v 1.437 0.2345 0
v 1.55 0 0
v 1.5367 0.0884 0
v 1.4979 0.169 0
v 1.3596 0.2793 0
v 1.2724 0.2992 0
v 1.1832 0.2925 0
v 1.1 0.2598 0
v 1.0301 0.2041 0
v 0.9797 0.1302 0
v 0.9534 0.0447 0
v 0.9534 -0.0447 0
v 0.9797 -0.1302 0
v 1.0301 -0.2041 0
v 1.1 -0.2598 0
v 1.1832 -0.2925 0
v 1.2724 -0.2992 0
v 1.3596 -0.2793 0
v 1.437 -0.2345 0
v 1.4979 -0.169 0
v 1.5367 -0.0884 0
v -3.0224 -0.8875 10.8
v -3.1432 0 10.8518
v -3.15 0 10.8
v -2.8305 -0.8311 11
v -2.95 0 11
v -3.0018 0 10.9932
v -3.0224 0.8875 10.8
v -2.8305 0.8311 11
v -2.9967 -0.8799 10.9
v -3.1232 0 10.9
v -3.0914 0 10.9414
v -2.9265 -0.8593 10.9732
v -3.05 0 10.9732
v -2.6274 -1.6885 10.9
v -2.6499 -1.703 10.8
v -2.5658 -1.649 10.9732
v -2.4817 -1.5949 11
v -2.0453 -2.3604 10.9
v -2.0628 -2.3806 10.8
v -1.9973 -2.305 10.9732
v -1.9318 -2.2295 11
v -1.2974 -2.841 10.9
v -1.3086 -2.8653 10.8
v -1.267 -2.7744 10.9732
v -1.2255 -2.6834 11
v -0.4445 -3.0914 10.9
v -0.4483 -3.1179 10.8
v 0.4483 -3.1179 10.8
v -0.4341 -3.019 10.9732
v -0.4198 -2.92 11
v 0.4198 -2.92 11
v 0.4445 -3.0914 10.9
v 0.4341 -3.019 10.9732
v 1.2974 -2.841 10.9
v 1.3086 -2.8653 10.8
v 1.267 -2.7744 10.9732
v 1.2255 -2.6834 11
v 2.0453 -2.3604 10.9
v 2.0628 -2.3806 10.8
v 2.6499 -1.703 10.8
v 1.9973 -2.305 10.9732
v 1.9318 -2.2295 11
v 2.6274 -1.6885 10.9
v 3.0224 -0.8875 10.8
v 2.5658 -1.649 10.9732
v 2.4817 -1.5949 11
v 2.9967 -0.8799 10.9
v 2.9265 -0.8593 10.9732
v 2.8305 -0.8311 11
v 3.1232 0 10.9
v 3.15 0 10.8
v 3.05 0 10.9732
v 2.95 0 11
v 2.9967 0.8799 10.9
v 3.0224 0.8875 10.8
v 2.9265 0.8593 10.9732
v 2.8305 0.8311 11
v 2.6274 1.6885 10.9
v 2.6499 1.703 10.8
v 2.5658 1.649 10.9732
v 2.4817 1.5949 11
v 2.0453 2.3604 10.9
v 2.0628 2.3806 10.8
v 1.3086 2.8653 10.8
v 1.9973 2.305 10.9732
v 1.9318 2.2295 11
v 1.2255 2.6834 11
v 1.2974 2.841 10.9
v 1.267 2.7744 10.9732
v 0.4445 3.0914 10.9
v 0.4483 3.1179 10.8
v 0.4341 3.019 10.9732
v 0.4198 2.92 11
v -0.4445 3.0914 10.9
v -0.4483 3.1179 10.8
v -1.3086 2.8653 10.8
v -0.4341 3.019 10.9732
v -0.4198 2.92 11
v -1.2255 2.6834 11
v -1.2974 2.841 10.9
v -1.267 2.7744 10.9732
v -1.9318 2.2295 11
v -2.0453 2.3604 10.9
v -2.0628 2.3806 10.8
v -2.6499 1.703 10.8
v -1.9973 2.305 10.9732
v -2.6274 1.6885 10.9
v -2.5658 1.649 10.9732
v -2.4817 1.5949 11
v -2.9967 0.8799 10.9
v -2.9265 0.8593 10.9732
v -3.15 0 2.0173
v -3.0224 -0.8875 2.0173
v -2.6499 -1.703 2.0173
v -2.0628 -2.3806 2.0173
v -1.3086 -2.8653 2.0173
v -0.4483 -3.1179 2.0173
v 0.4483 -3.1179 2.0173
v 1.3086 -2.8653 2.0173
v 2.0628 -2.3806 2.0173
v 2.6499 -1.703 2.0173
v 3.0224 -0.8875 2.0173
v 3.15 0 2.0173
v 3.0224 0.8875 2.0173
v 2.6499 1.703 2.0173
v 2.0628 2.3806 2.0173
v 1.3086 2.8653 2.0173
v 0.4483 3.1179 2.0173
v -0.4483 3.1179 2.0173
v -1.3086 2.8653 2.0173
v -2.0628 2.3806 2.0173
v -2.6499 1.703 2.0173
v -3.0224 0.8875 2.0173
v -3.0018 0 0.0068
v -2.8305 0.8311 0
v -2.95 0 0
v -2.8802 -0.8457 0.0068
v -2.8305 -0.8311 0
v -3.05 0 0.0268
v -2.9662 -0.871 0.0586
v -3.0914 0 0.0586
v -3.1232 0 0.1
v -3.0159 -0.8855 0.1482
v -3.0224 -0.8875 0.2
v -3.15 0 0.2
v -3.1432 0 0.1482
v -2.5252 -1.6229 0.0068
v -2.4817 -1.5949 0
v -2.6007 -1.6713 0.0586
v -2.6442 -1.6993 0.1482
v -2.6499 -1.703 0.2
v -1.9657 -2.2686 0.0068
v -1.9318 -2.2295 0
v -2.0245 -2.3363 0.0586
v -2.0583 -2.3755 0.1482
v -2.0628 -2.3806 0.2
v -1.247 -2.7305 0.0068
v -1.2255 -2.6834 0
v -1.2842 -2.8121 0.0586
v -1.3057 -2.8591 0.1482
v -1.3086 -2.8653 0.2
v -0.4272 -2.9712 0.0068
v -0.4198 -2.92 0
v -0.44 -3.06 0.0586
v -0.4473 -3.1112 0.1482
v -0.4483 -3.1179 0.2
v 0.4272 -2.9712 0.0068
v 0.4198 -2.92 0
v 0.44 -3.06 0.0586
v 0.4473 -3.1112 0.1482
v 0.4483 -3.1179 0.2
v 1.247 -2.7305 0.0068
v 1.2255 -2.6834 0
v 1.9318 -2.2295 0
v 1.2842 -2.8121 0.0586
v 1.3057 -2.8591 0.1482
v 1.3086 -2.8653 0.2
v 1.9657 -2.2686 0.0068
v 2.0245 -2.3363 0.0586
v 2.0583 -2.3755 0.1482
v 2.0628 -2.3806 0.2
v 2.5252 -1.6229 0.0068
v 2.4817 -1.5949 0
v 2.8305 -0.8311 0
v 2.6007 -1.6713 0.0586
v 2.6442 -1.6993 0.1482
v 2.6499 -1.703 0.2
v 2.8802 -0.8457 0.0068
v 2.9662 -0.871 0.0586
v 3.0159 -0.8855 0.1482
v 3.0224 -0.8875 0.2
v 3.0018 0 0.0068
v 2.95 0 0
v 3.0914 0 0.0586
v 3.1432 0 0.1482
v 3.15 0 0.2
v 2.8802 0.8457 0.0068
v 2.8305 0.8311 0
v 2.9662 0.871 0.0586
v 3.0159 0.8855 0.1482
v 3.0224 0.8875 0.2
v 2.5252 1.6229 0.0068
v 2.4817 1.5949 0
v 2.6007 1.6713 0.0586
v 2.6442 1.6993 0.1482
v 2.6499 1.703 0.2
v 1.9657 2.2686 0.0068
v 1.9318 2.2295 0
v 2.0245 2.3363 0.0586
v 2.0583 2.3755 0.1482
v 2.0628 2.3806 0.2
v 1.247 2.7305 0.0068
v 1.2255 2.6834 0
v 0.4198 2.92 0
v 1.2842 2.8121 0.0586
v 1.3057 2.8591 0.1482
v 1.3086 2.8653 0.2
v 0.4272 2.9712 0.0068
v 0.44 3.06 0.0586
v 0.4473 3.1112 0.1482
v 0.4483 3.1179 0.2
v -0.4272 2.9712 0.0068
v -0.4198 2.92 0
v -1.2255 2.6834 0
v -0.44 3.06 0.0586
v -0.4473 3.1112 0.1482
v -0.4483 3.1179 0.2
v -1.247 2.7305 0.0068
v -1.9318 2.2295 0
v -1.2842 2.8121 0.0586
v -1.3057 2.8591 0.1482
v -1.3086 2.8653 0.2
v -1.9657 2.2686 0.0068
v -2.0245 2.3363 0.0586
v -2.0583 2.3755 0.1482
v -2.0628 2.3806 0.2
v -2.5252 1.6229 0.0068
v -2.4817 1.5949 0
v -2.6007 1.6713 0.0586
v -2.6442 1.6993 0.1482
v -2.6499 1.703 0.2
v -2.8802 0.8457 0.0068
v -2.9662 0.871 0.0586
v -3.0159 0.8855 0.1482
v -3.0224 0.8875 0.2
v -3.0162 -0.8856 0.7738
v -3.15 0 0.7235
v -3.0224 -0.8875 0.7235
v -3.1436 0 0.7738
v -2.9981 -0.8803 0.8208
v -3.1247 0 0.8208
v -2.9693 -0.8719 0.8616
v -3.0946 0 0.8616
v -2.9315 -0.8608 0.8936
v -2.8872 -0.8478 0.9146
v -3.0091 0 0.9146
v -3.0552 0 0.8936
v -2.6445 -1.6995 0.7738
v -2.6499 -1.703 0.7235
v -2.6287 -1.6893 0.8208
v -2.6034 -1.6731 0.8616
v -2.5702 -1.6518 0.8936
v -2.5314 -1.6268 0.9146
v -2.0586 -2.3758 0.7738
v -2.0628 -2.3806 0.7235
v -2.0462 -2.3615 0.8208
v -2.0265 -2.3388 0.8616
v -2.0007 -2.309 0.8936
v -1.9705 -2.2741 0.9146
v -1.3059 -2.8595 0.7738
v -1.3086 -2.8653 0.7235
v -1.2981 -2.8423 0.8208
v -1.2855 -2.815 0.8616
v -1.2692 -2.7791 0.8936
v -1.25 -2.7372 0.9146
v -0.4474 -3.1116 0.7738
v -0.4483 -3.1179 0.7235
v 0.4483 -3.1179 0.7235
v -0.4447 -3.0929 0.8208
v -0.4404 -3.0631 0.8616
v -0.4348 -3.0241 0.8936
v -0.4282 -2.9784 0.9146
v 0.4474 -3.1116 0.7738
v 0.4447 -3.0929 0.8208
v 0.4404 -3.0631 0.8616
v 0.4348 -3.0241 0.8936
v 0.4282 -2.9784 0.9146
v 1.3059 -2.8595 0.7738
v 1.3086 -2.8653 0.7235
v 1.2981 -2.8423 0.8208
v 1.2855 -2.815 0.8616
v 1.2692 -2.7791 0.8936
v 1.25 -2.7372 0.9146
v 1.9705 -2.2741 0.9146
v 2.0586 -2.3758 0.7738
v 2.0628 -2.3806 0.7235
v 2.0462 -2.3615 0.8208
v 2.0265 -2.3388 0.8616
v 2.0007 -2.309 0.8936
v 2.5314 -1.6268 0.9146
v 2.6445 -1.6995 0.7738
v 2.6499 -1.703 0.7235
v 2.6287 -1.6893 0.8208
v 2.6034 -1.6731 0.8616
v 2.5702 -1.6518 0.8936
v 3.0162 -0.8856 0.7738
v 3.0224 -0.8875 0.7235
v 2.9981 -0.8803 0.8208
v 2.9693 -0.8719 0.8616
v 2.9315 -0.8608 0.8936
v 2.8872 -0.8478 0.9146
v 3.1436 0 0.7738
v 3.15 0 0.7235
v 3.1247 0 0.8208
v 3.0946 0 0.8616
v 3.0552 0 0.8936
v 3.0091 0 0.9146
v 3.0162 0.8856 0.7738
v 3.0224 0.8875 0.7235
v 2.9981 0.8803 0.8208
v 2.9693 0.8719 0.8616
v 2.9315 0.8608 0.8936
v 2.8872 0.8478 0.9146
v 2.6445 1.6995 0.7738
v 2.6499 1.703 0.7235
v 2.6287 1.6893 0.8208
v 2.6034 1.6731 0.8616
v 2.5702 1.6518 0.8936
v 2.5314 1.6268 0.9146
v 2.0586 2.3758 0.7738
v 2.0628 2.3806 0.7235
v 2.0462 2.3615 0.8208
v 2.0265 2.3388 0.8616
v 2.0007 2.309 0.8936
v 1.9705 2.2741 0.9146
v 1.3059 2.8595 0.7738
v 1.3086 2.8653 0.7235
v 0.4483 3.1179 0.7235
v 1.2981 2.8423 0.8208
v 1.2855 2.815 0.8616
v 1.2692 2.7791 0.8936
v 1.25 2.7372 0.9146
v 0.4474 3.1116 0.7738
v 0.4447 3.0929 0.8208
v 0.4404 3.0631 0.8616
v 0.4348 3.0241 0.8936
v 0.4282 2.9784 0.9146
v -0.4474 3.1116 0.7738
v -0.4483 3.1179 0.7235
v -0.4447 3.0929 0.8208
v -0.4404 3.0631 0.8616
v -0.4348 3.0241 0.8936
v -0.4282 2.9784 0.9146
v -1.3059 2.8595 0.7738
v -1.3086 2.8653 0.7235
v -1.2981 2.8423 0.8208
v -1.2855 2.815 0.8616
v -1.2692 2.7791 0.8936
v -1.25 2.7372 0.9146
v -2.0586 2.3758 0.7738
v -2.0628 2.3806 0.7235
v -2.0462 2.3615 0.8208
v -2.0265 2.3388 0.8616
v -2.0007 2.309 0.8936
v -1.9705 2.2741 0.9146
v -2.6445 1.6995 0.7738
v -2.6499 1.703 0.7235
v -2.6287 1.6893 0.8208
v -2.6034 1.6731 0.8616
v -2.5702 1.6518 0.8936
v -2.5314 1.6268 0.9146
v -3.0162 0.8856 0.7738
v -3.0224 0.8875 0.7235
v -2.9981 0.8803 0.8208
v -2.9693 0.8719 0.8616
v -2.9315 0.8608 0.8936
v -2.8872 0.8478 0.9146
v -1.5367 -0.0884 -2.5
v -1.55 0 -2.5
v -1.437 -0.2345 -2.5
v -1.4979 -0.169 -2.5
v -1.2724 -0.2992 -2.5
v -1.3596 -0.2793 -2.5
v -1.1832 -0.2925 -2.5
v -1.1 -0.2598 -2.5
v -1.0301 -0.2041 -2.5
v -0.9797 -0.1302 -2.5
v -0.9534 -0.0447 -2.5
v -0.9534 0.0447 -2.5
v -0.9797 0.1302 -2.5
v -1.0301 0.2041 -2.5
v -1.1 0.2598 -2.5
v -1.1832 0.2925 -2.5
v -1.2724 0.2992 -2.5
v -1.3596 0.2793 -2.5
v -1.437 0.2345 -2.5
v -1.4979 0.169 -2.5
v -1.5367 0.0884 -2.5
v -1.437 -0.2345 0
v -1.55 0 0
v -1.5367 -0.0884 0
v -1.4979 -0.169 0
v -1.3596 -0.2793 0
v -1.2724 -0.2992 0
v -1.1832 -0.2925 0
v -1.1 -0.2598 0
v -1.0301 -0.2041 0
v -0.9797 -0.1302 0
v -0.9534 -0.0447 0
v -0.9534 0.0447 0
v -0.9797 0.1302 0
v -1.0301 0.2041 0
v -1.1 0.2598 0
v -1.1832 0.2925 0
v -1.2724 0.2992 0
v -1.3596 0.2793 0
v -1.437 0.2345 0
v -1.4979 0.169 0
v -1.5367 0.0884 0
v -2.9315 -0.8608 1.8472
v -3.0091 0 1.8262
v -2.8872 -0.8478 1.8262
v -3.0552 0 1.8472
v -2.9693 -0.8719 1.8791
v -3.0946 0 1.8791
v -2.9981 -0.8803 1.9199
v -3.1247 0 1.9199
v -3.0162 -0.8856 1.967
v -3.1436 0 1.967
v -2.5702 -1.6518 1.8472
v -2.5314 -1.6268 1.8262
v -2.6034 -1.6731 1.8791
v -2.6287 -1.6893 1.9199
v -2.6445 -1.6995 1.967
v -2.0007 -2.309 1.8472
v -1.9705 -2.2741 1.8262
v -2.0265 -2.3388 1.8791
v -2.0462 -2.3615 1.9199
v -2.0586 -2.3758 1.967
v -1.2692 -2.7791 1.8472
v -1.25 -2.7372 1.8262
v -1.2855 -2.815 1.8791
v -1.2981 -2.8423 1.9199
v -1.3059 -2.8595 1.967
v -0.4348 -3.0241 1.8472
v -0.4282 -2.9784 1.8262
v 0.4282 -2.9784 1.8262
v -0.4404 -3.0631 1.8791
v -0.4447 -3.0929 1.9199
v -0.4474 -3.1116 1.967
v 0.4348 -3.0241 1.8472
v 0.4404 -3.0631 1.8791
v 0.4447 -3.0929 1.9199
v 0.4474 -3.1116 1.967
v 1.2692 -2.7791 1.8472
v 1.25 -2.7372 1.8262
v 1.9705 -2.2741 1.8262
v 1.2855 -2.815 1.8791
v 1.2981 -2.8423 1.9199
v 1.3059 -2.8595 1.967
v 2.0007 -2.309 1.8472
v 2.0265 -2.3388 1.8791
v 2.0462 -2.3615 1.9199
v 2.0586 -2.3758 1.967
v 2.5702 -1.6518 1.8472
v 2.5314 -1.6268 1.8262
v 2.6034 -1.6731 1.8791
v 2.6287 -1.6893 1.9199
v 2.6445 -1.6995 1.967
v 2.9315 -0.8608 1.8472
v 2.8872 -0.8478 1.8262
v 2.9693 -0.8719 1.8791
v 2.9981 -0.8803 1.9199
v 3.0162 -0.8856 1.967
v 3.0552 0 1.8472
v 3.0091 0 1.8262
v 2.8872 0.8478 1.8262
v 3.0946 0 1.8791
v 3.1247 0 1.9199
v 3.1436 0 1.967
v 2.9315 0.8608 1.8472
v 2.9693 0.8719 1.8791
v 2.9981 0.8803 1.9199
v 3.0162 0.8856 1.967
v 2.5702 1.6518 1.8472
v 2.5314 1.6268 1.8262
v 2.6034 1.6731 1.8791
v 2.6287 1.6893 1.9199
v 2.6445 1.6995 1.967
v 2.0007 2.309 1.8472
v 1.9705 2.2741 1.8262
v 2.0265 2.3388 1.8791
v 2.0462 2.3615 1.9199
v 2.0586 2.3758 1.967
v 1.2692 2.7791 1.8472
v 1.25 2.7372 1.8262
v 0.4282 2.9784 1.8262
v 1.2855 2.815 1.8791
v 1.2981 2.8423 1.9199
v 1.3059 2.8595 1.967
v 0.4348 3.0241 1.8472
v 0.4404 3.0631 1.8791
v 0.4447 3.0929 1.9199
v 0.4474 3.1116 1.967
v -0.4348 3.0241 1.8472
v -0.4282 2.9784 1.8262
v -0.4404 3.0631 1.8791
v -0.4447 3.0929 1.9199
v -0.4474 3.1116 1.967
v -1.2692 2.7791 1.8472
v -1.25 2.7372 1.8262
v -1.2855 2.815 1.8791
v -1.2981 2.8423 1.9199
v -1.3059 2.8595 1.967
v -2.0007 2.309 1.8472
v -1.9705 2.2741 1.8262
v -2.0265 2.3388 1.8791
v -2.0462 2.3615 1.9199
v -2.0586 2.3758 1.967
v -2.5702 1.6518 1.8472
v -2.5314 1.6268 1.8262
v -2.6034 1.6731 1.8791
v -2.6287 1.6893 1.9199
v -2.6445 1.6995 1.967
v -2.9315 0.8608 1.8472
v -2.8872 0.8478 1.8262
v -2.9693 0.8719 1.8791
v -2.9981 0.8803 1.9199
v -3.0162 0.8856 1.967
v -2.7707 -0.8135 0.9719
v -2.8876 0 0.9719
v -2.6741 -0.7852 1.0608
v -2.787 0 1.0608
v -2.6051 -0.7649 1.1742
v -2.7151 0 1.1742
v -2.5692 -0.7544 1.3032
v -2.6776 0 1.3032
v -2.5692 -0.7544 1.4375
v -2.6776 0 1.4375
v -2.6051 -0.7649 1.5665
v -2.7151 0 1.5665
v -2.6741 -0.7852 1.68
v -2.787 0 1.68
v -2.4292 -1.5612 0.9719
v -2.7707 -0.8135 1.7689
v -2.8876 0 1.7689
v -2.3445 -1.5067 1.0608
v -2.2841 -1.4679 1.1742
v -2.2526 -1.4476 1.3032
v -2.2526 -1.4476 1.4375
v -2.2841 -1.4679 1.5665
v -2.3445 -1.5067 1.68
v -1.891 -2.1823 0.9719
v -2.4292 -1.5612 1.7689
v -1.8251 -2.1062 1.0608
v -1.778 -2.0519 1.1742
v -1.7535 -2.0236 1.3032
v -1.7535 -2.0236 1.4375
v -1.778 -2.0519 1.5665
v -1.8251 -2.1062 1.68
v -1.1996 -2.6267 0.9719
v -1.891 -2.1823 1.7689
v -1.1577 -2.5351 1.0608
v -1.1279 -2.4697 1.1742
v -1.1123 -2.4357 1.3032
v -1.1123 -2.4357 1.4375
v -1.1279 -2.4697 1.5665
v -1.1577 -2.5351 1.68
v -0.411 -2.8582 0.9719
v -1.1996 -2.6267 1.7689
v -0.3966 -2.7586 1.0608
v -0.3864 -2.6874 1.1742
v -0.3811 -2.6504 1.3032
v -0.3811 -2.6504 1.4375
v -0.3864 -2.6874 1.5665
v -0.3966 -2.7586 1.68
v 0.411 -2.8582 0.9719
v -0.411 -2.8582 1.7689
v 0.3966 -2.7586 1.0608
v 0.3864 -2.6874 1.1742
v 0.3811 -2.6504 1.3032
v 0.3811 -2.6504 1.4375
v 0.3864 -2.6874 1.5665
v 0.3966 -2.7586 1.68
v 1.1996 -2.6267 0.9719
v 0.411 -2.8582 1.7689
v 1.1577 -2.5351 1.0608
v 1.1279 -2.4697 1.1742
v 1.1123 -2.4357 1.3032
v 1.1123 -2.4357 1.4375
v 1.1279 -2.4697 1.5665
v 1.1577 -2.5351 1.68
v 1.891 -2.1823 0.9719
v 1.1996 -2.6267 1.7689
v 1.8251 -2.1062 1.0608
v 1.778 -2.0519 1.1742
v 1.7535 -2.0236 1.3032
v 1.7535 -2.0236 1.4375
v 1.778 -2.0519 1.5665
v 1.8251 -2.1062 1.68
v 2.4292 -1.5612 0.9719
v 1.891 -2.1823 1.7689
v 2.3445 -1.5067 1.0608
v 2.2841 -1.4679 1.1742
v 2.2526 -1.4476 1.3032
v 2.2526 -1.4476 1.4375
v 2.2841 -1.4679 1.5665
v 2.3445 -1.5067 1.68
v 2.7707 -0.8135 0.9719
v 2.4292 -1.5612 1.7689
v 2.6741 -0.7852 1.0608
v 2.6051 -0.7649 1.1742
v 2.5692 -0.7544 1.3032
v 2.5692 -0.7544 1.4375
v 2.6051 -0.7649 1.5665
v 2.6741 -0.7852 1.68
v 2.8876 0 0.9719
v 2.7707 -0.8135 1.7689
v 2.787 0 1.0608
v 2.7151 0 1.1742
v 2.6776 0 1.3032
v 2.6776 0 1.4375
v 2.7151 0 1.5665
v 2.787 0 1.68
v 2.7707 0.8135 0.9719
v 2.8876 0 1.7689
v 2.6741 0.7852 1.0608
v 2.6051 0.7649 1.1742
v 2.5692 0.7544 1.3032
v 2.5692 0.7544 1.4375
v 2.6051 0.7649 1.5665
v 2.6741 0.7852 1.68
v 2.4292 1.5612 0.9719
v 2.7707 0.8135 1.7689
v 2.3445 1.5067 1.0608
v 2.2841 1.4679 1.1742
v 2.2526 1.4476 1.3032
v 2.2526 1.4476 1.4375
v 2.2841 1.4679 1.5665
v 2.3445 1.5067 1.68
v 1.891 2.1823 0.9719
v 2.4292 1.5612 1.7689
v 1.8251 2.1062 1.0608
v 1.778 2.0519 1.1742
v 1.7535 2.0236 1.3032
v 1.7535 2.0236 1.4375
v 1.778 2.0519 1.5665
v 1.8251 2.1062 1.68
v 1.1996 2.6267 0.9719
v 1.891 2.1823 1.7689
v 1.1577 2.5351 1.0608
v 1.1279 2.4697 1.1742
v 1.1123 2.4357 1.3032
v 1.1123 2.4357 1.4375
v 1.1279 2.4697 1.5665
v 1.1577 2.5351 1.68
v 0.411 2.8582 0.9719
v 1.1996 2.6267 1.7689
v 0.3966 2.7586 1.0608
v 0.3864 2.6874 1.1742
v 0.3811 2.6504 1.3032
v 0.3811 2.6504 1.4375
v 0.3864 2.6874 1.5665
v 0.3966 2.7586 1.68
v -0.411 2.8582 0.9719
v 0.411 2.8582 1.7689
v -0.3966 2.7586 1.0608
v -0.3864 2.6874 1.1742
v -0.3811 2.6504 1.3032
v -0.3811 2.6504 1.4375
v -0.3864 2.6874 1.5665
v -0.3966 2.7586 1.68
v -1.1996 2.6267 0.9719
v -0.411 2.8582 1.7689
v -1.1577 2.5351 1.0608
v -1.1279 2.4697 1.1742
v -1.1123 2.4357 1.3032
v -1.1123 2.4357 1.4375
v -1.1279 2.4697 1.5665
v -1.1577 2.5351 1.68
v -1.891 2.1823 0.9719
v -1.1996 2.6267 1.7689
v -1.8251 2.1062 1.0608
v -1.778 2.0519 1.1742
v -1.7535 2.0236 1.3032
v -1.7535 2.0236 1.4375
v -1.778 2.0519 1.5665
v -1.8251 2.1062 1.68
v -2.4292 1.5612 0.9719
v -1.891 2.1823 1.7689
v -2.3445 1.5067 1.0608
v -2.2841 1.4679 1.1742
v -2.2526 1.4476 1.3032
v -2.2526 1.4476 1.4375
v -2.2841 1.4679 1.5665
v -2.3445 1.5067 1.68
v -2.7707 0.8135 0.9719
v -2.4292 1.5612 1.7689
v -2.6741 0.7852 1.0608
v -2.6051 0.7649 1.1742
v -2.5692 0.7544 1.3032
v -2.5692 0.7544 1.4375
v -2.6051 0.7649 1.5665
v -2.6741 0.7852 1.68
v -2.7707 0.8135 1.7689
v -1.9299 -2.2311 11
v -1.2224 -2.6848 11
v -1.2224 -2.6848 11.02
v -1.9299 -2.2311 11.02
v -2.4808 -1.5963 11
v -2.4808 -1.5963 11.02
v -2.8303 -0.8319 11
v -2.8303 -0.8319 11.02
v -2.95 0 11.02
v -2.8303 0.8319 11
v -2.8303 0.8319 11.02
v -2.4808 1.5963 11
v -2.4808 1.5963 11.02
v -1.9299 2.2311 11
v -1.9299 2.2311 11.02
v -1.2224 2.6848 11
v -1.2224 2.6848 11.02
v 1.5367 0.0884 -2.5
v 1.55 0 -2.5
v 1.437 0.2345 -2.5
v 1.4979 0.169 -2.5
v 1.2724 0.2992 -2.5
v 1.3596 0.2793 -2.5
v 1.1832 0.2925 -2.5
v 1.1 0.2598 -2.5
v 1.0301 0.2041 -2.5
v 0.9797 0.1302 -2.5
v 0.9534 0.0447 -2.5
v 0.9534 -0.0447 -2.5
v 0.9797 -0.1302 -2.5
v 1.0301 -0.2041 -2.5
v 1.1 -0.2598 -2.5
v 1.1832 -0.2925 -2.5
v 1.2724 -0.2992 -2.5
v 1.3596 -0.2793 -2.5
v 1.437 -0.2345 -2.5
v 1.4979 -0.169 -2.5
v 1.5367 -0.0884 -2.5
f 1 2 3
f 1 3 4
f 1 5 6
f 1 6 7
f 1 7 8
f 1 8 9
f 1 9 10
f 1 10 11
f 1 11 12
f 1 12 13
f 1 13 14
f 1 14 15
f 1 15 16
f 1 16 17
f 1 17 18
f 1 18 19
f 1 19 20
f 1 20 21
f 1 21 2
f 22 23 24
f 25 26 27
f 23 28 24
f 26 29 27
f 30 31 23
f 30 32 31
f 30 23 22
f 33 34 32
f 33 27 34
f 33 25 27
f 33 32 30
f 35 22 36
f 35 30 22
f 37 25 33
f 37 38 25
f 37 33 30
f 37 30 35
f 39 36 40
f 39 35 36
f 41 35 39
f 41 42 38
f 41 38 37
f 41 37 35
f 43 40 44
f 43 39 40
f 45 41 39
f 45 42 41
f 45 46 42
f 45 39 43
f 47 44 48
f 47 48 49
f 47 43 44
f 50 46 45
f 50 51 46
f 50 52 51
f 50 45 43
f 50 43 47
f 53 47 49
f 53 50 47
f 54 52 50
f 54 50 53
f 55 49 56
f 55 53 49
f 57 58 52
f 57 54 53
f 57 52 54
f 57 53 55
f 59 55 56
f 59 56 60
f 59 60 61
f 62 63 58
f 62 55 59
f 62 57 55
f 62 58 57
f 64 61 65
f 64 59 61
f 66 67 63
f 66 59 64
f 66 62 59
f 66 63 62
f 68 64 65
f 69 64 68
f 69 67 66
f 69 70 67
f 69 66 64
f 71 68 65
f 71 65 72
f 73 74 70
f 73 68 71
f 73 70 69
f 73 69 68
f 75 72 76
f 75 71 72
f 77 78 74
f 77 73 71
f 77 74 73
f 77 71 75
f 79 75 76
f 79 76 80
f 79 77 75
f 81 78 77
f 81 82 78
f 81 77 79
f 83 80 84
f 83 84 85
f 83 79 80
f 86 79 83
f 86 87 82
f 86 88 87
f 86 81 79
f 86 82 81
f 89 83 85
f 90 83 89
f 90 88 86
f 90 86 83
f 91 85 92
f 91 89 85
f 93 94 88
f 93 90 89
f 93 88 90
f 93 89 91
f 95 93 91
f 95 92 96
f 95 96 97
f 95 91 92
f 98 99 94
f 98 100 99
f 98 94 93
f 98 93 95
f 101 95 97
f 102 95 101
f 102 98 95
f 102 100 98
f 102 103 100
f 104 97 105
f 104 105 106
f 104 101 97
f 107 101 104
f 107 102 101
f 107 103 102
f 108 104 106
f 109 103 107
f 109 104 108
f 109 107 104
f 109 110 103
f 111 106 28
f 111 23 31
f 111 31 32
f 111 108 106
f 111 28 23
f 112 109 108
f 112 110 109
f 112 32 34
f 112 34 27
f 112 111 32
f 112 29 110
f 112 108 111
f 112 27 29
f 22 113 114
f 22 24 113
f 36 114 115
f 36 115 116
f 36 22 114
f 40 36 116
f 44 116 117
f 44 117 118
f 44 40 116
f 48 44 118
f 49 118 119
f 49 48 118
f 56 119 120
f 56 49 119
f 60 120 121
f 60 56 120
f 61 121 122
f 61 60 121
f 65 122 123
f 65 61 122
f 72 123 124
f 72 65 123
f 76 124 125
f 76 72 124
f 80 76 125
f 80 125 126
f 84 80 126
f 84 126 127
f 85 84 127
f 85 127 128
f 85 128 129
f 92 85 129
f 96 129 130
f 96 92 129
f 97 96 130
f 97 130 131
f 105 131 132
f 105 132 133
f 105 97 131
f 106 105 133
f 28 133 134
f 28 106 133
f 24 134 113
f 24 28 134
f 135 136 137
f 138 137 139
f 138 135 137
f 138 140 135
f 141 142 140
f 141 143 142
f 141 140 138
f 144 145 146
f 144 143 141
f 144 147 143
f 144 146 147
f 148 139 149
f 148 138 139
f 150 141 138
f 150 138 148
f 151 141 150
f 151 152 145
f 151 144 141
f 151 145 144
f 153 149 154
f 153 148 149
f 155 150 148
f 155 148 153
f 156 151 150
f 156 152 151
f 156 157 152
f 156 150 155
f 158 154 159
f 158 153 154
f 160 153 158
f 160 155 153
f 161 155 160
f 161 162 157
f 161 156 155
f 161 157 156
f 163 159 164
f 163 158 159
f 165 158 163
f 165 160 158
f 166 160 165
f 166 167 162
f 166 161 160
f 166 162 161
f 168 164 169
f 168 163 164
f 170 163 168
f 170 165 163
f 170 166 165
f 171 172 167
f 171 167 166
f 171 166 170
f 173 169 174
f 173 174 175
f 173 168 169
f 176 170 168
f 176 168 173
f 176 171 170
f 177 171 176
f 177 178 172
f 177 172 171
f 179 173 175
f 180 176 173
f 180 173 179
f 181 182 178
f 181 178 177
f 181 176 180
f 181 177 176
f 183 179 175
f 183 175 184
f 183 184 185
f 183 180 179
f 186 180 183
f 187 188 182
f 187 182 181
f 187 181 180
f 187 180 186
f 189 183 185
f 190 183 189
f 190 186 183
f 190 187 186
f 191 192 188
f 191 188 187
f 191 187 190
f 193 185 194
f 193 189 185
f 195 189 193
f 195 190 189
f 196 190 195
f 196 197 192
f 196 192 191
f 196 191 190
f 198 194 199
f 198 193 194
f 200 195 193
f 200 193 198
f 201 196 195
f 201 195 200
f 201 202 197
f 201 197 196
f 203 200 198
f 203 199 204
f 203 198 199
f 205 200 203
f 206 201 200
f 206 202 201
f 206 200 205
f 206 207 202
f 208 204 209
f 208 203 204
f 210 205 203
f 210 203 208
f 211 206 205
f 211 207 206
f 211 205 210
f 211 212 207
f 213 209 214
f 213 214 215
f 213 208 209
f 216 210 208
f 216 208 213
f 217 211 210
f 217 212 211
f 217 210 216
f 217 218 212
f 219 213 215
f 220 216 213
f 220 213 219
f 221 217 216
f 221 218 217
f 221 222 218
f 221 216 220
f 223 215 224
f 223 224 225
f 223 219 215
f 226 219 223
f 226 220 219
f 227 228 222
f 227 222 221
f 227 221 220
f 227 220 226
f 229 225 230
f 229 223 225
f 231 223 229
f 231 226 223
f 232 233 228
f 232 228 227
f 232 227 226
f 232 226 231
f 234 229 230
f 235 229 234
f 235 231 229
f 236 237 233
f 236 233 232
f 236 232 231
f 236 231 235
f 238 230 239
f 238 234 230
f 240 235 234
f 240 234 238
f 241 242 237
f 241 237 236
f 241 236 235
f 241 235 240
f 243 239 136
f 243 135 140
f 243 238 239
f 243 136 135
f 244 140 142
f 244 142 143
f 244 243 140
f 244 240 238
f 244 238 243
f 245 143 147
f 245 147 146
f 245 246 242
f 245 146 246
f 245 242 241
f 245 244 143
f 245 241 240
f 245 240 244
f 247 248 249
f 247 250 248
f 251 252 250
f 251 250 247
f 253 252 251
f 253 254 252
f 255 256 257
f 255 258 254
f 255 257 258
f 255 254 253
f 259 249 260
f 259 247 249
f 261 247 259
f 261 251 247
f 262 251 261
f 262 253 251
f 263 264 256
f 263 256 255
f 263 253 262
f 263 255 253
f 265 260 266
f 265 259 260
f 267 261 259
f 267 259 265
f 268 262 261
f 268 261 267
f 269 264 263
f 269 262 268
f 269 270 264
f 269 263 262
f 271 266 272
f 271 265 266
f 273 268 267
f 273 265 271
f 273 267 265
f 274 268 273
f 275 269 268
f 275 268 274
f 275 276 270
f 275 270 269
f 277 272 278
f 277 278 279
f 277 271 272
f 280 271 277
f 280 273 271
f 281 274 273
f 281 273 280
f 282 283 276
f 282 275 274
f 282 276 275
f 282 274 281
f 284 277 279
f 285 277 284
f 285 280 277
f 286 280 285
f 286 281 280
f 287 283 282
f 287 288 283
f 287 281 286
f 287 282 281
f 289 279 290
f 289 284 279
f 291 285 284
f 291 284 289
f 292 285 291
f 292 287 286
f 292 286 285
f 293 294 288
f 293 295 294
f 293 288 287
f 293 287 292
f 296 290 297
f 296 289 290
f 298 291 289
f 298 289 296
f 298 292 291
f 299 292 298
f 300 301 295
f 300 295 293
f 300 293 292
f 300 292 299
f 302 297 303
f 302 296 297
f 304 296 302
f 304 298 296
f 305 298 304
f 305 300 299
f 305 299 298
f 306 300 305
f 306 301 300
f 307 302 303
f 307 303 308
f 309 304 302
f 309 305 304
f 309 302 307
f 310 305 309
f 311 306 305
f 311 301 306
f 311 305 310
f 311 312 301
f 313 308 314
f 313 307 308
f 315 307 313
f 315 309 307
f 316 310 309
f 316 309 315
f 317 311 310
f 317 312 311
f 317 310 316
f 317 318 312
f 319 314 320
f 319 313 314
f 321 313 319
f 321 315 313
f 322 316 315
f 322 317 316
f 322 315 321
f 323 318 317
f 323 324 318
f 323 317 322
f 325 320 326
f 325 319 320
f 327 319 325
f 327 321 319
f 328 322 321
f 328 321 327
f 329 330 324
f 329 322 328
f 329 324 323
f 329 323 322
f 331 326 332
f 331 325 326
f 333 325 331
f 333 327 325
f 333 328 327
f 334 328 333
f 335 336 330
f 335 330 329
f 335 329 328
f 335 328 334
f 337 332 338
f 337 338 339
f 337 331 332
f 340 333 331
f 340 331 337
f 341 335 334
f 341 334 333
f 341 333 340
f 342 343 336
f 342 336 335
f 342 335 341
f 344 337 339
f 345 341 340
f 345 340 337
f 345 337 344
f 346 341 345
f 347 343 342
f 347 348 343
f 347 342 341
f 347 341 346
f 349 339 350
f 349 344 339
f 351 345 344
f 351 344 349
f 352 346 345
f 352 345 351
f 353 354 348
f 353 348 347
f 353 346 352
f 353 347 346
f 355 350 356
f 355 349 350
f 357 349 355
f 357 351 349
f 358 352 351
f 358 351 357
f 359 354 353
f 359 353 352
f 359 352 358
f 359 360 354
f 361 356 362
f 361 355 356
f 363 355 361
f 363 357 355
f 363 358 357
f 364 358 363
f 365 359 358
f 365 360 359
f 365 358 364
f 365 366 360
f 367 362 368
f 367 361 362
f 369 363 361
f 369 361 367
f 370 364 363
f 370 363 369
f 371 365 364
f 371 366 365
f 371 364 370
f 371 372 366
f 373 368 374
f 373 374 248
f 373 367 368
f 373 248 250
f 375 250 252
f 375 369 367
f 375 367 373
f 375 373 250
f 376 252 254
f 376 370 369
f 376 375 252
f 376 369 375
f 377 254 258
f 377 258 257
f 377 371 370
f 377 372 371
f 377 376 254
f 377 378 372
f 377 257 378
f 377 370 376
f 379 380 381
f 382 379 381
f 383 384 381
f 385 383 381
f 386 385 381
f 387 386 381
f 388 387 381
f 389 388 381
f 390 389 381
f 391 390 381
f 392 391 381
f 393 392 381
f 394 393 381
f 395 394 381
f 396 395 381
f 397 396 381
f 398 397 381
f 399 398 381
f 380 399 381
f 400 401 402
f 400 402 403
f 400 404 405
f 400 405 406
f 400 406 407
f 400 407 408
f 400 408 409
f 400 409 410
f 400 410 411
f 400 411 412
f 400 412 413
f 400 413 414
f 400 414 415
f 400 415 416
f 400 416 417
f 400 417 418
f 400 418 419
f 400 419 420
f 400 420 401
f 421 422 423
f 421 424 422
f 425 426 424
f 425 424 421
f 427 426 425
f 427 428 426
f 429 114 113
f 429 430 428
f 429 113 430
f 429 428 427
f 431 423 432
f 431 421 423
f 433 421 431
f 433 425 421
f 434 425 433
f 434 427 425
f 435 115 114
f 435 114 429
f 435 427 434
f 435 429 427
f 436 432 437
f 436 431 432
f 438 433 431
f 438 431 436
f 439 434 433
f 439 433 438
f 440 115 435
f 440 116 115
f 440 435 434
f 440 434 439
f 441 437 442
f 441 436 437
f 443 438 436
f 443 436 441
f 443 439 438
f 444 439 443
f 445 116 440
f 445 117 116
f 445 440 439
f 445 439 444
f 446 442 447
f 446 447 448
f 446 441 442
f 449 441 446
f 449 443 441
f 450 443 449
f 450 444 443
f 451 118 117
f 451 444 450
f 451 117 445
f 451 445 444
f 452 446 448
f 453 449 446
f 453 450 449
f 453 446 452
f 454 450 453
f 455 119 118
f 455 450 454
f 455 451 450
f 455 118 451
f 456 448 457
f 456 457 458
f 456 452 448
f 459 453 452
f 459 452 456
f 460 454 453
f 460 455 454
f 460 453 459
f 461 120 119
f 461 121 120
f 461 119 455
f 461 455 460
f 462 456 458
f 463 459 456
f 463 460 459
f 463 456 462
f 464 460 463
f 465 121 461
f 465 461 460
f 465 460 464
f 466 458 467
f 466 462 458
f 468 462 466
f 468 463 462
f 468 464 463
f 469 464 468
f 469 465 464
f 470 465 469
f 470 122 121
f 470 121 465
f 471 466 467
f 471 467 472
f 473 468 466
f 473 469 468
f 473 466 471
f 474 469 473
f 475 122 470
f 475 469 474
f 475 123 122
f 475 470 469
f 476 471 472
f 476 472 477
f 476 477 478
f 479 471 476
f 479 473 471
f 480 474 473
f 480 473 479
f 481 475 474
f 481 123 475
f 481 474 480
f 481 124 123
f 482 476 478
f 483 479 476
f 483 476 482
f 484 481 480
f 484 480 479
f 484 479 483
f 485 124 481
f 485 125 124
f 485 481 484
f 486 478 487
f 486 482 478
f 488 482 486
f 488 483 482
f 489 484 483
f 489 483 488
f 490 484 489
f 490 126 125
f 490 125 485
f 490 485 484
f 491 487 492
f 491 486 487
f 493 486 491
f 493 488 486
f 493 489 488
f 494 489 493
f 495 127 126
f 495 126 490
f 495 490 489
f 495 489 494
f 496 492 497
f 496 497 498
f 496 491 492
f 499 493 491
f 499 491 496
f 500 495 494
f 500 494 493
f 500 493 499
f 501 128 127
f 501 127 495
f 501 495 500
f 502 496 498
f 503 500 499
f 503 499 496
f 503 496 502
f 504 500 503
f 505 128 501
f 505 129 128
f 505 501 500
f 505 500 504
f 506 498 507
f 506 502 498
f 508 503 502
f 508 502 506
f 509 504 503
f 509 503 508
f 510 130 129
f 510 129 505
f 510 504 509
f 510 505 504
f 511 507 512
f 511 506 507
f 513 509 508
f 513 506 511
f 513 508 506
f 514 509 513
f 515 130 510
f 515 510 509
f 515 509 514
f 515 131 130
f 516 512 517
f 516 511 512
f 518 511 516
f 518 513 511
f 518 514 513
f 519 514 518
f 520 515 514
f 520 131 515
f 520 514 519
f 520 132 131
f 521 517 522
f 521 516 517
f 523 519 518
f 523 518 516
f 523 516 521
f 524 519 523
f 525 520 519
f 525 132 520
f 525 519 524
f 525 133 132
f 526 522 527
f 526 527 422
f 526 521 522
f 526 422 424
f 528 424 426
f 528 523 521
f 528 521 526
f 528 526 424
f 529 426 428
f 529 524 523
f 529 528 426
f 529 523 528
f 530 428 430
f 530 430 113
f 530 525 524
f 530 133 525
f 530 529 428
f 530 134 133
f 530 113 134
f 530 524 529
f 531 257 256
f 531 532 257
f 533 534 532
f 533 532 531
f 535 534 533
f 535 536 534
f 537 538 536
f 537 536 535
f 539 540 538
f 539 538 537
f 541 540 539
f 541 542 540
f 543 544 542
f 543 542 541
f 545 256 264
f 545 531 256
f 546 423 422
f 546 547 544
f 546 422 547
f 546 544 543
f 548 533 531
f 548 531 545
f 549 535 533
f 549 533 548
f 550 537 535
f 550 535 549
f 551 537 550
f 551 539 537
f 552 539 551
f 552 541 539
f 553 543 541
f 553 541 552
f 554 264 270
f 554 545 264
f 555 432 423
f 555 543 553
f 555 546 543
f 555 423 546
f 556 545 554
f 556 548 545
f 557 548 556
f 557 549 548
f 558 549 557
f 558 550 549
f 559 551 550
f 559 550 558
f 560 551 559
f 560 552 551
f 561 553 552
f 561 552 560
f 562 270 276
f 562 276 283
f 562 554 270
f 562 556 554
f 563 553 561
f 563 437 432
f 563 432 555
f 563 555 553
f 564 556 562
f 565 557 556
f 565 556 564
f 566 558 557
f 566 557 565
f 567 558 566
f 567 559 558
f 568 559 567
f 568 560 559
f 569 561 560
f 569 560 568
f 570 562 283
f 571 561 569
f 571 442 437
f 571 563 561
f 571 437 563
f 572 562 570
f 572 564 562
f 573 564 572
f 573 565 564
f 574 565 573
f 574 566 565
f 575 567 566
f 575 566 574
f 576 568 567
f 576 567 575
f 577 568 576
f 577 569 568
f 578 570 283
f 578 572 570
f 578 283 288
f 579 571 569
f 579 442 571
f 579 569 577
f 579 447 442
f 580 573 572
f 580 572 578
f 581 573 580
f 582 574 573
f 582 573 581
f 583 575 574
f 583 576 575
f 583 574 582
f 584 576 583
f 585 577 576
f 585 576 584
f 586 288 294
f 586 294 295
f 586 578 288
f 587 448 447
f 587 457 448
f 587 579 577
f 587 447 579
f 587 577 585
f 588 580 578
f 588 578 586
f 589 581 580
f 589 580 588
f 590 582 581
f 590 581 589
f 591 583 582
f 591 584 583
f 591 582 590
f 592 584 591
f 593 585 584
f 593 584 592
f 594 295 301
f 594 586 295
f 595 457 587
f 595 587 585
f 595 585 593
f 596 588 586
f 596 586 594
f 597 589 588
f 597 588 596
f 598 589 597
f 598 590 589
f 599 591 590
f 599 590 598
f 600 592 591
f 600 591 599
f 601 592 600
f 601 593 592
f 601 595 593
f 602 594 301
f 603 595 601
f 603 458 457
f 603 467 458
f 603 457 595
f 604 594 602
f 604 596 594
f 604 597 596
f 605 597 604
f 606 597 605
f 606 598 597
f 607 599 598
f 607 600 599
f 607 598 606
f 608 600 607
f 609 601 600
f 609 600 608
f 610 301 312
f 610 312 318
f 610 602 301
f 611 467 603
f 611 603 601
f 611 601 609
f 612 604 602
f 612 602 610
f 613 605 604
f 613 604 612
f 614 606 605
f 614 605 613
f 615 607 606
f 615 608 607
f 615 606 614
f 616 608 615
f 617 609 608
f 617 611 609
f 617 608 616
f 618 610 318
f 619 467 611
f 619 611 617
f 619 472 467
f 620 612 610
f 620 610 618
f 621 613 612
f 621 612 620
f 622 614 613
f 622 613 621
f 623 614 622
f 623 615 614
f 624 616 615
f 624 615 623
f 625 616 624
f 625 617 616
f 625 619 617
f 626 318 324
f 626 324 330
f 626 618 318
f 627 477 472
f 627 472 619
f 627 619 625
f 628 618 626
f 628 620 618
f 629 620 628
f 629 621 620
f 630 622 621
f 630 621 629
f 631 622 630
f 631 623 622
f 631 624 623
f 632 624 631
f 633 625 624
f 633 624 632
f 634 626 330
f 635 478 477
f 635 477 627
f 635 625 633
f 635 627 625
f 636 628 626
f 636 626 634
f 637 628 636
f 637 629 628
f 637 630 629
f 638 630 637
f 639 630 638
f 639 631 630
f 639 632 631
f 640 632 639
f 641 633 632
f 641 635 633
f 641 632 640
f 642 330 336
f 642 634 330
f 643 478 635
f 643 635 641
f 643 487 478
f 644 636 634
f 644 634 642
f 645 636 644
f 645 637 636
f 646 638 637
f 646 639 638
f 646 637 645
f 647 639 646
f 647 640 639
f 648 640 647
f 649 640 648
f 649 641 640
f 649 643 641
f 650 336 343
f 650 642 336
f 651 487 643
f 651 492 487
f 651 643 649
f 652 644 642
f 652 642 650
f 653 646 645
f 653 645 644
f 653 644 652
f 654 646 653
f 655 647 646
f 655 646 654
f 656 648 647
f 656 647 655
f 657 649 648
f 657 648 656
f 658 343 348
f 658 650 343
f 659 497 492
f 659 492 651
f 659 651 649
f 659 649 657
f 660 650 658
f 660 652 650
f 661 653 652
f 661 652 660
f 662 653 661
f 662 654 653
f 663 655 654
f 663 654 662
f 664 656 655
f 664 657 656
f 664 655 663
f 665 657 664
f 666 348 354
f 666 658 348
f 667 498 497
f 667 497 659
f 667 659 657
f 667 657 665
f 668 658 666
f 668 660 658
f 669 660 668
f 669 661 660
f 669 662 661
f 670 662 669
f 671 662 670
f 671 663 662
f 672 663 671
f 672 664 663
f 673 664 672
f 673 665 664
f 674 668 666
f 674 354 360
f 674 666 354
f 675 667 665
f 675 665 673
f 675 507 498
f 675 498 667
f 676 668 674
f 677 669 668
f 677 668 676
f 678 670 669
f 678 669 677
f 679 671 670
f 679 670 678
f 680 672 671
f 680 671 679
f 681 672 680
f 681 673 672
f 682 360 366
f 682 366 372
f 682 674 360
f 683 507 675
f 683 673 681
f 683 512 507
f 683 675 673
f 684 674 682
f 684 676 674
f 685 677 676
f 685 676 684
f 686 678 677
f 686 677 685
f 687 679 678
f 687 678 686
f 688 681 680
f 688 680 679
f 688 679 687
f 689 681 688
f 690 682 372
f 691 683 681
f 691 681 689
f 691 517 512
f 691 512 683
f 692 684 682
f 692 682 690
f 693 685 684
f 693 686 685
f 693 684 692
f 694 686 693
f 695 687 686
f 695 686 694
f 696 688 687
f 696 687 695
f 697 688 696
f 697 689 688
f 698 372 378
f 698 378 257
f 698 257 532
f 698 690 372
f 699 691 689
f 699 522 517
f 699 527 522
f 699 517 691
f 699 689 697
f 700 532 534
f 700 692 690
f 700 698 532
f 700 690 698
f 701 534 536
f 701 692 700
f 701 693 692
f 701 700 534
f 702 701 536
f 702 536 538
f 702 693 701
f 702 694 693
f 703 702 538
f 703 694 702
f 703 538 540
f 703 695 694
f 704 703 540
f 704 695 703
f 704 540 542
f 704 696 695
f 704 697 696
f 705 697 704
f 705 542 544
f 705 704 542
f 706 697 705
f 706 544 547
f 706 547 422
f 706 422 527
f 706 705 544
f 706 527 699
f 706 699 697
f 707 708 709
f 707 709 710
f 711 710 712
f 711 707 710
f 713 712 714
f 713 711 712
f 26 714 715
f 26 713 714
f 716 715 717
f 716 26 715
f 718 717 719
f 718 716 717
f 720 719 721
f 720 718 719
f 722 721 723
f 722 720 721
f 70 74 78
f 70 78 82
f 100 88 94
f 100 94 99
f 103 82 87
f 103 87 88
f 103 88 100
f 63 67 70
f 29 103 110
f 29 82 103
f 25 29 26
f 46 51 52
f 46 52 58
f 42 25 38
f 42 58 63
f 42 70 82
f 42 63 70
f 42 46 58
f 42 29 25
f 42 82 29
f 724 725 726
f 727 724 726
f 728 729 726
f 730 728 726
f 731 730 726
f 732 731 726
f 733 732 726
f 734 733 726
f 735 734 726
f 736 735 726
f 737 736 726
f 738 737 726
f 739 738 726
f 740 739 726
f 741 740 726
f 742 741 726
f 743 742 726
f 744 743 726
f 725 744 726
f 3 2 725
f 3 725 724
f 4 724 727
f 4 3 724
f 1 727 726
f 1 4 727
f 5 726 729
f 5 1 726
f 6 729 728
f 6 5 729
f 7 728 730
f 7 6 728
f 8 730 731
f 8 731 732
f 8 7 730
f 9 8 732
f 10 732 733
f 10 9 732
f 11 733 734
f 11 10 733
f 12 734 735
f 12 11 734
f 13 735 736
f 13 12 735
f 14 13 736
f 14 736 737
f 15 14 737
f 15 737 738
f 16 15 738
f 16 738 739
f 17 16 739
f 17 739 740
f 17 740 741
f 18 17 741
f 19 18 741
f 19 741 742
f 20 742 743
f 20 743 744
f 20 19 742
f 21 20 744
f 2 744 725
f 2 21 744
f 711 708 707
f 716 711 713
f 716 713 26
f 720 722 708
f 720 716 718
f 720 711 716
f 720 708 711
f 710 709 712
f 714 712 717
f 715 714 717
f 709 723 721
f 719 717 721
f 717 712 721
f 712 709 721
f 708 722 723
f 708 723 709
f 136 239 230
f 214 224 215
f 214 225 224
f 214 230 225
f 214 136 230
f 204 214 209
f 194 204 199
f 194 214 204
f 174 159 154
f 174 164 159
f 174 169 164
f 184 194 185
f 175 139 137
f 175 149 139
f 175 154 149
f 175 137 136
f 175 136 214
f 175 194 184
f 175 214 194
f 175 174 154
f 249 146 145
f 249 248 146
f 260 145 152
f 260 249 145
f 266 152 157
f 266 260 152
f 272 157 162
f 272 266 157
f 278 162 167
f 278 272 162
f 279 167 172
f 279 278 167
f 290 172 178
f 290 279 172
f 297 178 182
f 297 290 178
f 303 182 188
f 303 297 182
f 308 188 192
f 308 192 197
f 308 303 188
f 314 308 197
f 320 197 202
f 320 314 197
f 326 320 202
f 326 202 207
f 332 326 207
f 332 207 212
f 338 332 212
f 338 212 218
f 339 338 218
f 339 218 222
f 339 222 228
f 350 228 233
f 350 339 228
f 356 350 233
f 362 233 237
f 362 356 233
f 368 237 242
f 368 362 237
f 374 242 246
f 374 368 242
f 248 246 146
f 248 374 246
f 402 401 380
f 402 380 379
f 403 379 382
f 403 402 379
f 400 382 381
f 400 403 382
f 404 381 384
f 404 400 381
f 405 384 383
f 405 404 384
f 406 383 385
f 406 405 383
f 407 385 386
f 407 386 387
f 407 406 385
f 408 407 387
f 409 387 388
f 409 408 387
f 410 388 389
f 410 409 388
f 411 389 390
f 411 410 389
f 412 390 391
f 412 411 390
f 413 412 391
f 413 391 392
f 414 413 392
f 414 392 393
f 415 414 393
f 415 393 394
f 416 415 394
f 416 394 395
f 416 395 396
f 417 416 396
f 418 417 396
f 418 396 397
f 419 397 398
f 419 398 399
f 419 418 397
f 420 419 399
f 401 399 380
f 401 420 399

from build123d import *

# Parameters (mm, degrees)
SKETCH_2_R        = 0.3
EXTRUDE_1_DEPTH   = 2.5
EXTRUDE_1_2_DEPTH = 2.5
EXTRUDE_2_DEPTH   = 0.02


with BuildPart() as part:
    # Эскиз1 → Повернуть1 (revolve)
    with BuildSketch(Plane(origin=(0, 0, 0), x_dir=(1, 0, 0), z_dir=(0, 1, 0))):
        with BuildLine():
            Line((-3.15, -2.017273049), (-3.15, -10.8))
            ThreePointArc((-3.15, -10.8), (-3.091421356, -10.941421356), (-2.95, -11))
            Line((-2.95, -11), (0, -11))
            Line((0, -11), (0, 0))
            Line((0, 0), (-2.95, 0))
            ThreePointArc((-2.95, 0), (-3.091421356, -0.058578644), (-3.15, -0.2))
            Line((-3.15, -0.2), (-3.15, -0.723485332))
            ThreePointArc((-3.15, -0.723485332), (-3.11095807, -0.842197167), (-3.009075002, -0.91456161))
            ThreePointArc((-3.009075002, -0.91456161), (-2.672894643, -1.370379191), (-3.009075002, -1.826196771))
            ThreePointArc((-3.009075002, -1.826196771), (-3.11095807, -1.898561214), (-3.15, -2.017273049))
        make_face()
    revolve(axis=Axis((0, 0, 0), (0, 0, 1)))


with BuildPart() as body_2:
    # Эскиз2 → Бобышка-Вытянуть1 (new body)
    with BuildSketch(Plane.XY):
        with Locations((1.25, 0)):
            Circle(SKETCH_2_R)
    extrude(amount=-EXTRUDE_1_DEPTH)


with BuildPart() as body_3:
    # Эскиз2 → Extrude 1 2 (new body)
    with BuildSketch(Plane.XY):
        with Locations(Location((-1.25, 0, 0), (0, 0, 180))):
            Circle(SKETCH_2_R)
    extrude(amount=-EXTRUDE_1_2_DEPTH)


with BuildPart() as body_4:
    # Эскиз3 → Бобышка-Вытянуть2 (new body)
    with BuildSketch(Plane.XY.offset(11)):
        with BuildLine():
            Line((-1.222424003, 2.684805311), (-1.222424003, -2.684805311))
            ThreePointArc((-1.222424003, -2.684805311), (-2.95, 0), (-1.222424003, 2.684805311))
        make_face()
    extrude(amount=EXTRUDE_2_DEPTH)


solid = Compound([part.part, body_2.part, body_3.part, body_4.part])
